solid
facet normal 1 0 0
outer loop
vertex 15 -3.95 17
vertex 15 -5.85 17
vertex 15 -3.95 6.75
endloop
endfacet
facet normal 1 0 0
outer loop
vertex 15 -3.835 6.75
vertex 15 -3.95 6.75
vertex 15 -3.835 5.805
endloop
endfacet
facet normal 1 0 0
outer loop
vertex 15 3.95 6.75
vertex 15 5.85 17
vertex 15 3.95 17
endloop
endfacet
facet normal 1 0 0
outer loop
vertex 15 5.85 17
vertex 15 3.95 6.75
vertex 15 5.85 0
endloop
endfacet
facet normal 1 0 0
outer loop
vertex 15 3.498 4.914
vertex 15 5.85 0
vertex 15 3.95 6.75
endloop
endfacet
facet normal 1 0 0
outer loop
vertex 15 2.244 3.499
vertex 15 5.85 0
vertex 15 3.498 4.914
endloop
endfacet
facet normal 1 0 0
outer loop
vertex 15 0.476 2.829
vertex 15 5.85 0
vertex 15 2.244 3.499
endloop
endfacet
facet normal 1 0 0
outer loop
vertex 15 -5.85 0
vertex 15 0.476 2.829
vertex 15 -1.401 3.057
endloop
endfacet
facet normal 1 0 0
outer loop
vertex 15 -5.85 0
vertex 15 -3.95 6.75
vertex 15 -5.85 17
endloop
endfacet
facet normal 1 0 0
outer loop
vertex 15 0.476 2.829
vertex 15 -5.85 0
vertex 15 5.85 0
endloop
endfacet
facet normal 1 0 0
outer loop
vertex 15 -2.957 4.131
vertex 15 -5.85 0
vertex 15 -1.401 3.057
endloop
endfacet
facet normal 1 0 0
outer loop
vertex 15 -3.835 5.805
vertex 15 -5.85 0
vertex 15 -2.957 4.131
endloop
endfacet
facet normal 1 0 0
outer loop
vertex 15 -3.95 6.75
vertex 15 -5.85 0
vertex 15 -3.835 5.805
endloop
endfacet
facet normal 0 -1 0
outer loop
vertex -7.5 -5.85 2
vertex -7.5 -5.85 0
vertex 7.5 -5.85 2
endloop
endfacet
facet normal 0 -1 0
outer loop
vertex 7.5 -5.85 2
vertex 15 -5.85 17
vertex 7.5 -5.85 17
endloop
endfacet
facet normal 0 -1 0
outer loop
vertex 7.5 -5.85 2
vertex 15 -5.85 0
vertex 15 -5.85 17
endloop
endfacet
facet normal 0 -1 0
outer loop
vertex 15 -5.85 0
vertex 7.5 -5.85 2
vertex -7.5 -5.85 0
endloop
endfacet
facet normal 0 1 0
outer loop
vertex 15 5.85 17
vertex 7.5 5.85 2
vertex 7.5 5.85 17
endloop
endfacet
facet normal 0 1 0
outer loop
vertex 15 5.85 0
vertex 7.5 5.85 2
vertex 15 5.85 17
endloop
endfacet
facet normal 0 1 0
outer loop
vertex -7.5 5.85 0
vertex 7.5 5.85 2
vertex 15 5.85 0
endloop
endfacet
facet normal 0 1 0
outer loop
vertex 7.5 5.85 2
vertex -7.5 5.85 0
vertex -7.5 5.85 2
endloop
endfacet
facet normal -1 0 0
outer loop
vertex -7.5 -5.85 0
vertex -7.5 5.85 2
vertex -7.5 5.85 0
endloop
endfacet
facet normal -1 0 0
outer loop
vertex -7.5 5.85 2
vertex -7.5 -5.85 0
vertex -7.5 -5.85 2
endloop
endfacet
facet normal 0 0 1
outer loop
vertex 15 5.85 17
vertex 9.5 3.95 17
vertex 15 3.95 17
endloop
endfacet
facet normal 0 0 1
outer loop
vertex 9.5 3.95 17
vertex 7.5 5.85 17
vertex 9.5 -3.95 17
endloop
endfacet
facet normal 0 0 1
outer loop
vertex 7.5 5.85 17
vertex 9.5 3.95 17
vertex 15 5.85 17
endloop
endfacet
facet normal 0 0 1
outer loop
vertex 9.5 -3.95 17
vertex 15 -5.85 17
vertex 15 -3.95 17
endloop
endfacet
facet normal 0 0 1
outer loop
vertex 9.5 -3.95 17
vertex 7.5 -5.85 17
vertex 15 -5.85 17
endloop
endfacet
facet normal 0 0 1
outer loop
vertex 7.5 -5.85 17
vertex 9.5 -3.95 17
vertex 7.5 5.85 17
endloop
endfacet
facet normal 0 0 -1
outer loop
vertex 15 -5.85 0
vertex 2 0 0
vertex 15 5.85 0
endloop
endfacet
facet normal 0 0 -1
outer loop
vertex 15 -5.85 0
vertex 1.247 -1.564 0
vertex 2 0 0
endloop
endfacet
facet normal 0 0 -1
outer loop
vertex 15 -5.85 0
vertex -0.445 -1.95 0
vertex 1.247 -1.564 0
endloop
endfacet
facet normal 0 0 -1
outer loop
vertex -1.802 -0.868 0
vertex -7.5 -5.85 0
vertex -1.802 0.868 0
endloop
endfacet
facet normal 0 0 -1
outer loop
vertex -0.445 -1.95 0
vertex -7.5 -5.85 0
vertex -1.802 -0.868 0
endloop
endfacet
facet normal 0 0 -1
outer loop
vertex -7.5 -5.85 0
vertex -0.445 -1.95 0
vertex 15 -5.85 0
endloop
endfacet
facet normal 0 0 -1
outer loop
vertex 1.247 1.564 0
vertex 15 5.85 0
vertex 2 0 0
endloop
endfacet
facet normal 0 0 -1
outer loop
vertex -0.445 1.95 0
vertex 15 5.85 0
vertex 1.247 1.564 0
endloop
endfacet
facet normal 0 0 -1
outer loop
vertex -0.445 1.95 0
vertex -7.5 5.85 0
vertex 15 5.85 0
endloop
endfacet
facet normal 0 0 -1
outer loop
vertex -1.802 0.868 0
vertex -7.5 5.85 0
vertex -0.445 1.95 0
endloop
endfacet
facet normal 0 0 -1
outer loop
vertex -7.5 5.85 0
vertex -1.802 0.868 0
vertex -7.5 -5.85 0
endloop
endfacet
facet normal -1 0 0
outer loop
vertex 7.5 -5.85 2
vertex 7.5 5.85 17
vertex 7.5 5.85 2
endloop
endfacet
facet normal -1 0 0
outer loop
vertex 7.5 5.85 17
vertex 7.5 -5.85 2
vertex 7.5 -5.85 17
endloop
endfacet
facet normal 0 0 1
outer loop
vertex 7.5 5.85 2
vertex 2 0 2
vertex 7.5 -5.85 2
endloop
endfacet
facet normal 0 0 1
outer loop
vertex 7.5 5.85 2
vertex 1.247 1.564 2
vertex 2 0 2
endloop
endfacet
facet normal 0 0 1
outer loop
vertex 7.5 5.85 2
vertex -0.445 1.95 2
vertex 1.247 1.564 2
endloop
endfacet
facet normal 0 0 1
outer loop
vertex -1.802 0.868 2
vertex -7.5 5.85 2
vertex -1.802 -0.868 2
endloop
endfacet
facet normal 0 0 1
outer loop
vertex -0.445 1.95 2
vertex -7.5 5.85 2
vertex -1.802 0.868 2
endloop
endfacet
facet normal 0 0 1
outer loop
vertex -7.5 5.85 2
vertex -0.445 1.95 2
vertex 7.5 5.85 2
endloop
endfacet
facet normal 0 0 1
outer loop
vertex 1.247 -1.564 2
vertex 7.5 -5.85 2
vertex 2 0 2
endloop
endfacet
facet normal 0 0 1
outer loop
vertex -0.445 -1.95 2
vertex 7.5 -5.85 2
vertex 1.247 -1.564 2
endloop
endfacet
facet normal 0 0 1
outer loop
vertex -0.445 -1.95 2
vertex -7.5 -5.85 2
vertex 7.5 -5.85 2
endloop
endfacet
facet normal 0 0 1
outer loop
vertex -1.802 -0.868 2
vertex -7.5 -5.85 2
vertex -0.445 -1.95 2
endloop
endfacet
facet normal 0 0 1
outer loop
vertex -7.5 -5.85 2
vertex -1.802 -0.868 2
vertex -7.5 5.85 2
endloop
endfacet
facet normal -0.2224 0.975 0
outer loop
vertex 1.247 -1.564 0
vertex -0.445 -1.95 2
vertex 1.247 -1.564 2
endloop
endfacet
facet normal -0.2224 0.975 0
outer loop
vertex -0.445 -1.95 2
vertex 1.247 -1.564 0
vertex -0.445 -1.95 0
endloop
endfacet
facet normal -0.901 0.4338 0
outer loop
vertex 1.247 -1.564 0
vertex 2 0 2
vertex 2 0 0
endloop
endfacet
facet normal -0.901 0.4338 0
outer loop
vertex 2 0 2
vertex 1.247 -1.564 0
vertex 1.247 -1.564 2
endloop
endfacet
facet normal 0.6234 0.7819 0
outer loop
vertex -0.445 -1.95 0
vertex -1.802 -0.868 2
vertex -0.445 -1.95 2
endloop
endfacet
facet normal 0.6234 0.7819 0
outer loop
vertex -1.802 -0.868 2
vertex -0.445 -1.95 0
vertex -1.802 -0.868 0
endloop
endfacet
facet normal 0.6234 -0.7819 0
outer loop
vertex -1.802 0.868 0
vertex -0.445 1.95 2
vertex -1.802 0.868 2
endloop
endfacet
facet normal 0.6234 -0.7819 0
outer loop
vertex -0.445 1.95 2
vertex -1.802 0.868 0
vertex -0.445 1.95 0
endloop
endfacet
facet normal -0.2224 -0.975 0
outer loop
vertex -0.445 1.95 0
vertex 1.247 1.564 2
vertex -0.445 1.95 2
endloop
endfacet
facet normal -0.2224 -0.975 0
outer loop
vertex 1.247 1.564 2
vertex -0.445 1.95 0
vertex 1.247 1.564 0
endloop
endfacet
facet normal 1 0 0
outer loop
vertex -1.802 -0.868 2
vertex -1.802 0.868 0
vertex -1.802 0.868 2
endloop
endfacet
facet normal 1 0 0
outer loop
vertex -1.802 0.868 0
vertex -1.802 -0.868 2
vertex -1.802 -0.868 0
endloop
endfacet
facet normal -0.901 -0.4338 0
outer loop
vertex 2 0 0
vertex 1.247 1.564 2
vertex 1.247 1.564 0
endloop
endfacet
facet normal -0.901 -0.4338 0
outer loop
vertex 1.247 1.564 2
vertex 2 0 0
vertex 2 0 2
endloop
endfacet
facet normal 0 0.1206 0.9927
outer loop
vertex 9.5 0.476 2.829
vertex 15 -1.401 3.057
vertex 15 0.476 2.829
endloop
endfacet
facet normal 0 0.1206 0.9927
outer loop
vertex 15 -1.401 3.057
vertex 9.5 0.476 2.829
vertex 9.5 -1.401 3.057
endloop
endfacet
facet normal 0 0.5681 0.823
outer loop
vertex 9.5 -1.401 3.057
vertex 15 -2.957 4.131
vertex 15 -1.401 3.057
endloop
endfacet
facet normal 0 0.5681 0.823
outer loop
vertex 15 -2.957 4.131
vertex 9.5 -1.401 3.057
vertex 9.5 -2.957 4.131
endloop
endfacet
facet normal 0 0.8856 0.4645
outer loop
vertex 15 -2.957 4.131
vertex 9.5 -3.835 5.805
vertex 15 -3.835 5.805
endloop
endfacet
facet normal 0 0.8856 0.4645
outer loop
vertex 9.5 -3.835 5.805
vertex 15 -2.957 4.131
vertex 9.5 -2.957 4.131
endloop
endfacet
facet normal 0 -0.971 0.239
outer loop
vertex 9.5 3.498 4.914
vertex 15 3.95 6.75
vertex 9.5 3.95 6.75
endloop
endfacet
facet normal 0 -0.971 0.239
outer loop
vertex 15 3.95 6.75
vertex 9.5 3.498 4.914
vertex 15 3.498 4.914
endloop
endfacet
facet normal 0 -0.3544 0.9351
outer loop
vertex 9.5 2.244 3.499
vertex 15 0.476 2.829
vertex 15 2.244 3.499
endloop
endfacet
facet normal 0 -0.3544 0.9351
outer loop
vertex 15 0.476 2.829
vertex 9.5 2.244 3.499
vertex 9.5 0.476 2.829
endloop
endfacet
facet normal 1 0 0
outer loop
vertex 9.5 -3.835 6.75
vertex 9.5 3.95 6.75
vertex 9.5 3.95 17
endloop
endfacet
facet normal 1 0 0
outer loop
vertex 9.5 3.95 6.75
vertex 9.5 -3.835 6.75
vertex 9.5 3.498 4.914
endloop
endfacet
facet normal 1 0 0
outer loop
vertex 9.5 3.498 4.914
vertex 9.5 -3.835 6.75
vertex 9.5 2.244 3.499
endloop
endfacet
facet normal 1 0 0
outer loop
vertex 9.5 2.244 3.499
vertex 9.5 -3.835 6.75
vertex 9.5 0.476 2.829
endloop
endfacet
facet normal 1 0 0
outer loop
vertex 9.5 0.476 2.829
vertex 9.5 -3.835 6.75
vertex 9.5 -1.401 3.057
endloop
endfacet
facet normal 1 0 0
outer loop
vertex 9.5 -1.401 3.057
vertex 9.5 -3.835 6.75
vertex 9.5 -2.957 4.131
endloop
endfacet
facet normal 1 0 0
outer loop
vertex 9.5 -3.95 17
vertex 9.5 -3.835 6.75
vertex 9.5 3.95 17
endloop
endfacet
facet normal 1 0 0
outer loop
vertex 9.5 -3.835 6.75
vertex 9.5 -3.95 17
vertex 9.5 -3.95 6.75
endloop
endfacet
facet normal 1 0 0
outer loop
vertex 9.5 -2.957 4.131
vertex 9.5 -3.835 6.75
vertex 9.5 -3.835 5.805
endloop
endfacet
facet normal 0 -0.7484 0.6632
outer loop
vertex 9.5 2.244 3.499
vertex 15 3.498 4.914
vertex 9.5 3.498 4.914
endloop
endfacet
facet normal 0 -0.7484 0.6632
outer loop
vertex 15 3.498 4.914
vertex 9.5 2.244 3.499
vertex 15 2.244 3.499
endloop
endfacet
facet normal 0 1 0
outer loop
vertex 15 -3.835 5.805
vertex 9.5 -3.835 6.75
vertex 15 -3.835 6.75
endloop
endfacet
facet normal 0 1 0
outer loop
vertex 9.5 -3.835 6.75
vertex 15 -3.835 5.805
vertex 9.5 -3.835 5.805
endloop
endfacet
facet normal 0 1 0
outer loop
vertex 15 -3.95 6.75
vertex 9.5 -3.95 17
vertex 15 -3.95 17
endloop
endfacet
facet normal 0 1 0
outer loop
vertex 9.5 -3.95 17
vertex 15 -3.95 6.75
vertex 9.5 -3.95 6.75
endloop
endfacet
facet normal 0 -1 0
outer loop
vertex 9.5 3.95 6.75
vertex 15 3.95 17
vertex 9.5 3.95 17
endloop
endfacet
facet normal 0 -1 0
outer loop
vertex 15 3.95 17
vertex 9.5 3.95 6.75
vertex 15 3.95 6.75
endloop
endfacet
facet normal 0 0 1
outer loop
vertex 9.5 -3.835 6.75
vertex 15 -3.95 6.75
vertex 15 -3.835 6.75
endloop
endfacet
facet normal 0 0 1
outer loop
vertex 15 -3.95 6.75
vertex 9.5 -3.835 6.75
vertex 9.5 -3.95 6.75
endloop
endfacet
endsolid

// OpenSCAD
//CUSTOMIZER VARIABLES

// attachment rod diameter, in mm
rod_diameter= 7.7;  // [2:0.1:20]

// attachment rod covered length in clip, in mm
rod_length= 5.5;  // [2:0.1:40]

// attachment rod height off table, in mm
rod_height= 14.2;  // [2:0.1:40]

// attachment rod space on either side, in mm
rod_side_margin= 2.0;  // [1:1:20]

// attachment rod extra length, in mm
rod_length_margin= 2.0;  // [1:1:20]

// beam clip height margin, in mm
clip_margin= 2;   // [1:20]

// Openbeam bolt diameter, in mm
bolt_diameter= 3.0;    // [2:0.1:20]

// Openbeam size, in mm
openrail_size= 15;   // [10:50]

//CUSTOMIZER VARIABLES END


// Sanity checks
if( rod_diameter <= 0
   || bolt_diameter <= 0 
   || openrail_size <= 0 )
{
    echo("<B>Error: Missing important parameters</B>");
}


main_depth= max( rod_diameter,bolt_diameter ) + 2*rod_side_margin;
main_height= max( openrail_size+clip_margin, rod_height+rod_side_margin );

// our object, translated and rotated to be flat on xy plane for easy STL generation
translate([0,0,main_height-openrail_size/2])
  rotate ([90,0,0])
    alignment_clip();

module alignment_clip(){

    main_width= openrail_size+rod_length_margin+rod_length;
    bolt_rad= (bolt_diameter+1)/2;
    rod_rad= (rod_diameter+0.2)/2;

    difference(){

      // the main block
      translate([(main_width-openrail_size)/2,-(main_height/2)+(openrail_size/2),0])
        cube([main_width,main_height,main_depth],center = true);

      // subtract the space used by the openbeam
      translate([-openrail_size/2-1,-openrail_size/2,-(main_depth/2)-2])
        cube([openrail_size+1, openrail_size+1, main_depth+5]);

      // bolt hole for attaching to beam
      translate([0,-3,0])
        rotate([90,0,0])
          cylinder(main_height+2,bolt_rad,bolt_rad);

      // rod hole/slot
      translate([main_width-rod_length-openrail_size/2,-rod_height+rod_rad+openrail_size/2,0])
        rotate([0,90,0])
          cylinder(rod_length+2,rod_rad,rod_rad);
      translate([main_width-rod_length-openrail_size/2,-rod_height+rod_rad+openrail_size/2,-rod_rad])
        cube([rod_length+2,rod_height-rod_rad+2,2*rod_rad]);
       
    }
}
